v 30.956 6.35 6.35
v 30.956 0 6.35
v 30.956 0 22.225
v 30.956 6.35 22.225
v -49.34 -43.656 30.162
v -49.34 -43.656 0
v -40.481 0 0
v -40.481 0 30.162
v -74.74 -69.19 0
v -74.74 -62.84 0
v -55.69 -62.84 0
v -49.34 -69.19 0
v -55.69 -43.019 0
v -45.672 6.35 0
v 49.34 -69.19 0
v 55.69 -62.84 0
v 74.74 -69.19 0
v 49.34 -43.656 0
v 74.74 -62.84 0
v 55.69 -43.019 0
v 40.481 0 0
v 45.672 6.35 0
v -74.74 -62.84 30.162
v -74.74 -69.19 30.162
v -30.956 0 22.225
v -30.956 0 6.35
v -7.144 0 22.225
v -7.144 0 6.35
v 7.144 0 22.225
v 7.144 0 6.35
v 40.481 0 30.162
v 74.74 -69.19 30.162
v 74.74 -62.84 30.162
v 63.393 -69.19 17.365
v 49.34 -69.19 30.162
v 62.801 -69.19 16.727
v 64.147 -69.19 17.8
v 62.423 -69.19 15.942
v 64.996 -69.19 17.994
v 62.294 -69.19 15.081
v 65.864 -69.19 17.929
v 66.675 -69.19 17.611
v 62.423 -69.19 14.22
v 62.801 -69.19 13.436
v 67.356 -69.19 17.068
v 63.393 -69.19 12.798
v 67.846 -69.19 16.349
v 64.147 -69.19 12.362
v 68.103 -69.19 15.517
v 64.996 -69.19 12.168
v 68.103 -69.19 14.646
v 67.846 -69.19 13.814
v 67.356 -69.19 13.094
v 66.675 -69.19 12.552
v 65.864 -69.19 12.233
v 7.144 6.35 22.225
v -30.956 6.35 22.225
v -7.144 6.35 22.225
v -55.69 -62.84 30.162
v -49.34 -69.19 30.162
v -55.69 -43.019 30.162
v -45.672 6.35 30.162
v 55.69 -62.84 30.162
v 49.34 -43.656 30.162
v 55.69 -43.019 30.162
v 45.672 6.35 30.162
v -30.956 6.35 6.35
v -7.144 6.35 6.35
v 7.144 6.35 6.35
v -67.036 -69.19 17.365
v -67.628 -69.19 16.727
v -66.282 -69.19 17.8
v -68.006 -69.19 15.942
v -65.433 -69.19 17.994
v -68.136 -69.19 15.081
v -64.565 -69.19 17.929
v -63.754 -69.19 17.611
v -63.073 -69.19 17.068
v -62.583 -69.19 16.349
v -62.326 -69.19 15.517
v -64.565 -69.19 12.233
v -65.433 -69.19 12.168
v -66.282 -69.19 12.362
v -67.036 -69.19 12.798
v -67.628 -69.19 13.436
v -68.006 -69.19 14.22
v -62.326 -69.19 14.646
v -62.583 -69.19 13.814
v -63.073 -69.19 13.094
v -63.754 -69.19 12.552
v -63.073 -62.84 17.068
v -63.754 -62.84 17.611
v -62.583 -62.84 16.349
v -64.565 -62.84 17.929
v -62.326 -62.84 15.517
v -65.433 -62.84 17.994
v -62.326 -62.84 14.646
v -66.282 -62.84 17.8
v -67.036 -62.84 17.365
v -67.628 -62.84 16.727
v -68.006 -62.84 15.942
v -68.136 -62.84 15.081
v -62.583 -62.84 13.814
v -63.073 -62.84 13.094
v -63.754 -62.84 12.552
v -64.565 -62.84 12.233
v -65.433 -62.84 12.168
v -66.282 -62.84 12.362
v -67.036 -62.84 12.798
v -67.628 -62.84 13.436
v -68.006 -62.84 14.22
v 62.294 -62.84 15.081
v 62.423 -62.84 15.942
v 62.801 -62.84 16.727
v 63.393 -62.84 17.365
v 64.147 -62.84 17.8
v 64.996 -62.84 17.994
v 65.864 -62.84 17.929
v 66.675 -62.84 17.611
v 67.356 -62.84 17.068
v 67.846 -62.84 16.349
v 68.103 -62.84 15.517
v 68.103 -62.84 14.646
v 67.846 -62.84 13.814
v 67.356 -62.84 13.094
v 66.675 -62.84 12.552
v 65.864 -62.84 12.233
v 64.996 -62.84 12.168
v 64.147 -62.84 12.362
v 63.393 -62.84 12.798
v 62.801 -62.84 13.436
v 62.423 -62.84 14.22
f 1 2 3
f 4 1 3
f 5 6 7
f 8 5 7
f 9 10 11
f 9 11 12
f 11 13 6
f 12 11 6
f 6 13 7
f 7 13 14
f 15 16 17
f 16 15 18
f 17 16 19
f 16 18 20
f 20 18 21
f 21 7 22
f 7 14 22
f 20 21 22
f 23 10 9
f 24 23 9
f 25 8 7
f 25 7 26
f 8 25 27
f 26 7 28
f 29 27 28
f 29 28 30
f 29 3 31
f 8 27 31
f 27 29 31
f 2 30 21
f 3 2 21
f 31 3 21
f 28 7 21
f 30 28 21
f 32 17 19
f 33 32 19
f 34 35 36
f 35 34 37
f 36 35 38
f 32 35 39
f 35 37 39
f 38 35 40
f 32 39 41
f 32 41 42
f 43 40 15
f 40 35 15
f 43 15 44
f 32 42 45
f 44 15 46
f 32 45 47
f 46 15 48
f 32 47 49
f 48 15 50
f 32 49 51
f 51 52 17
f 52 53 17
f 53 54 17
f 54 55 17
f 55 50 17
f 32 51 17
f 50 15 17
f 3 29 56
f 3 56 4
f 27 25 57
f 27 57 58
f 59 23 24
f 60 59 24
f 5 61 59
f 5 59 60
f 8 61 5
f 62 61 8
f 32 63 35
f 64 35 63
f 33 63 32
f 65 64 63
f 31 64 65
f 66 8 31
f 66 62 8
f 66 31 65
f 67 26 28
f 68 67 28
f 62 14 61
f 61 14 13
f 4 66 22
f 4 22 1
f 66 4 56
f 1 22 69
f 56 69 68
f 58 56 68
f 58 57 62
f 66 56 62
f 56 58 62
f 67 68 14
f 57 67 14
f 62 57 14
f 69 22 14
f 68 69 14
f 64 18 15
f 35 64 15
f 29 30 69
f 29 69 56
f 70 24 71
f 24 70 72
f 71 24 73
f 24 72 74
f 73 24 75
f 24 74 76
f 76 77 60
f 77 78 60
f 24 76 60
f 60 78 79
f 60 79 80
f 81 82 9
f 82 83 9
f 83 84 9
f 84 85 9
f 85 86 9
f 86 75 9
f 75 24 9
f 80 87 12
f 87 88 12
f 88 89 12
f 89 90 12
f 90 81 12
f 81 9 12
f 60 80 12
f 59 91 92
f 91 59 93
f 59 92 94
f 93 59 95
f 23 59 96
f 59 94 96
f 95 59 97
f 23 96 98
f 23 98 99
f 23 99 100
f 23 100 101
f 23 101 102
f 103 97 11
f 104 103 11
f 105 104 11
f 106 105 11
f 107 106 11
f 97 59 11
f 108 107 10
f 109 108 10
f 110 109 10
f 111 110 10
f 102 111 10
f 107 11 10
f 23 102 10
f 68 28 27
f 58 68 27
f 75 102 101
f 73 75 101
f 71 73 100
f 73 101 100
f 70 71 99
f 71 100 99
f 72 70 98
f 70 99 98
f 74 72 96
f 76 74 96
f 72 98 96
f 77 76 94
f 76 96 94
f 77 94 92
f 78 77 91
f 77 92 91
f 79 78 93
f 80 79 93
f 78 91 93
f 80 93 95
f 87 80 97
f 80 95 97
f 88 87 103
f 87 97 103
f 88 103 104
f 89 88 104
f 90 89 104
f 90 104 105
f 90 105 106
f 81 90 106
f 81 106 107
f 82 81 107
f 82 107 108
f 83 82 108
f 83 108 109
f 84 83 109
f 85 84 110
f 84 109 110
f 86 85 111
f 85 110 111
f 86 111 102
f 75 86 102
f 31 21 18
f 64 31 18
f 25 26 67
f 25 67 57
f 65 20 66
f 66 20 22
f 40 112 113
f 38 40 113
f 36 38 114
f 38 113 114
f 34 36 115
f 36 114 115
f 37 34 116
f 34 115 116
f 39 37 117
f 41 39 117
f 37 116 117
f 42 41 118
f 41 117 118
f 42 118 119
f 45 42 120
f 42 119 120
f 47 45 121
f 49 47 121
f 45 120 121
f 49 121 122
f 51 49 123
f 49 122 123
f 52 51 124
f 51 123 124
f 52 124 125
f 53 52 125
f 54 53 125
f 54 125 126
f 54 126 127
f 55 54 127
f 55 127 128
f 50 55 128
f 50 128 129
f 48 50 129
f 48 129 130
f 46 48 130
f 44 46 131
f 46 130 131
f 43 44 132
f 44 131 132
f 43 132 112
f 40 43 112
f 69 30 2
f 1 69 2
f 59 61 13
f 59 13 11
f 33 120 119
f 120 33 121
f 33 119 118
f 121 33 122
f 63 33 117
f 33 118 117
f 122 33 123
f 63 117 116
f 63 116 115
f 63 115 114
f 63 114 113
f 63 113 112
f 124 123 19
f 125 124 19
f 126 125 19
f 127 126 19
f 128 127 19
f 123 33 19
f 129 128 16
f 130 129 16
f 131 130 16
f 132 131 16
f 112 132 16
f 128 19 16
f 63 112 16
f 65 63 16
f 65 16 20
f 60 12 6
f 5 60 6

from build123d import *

# Parameters (mm, degrees)
F1_DEPTH = 30.1625
F2_W     = 23.8125
F2_H     = 15.875
F3_DEPTH = 6.35
F4_R     = 2.921
F5_DEPTH = 6.35


# Not quite as in the source:
# - a feature names something its author has since deleted; it is built from what else it names


with BuildPart() as f1:
    # F0 (on Top) → F1 (new body)
    with BuildSketch(Plane.XY):
        Polygon((-40.48125, 0), (0, 0), (40.48125, 0), (49.3395, -43.65625), (49.3395, -69.1896), (55.6895, -69.1896), (74.7395, -69.1896), (74.7395, -62.8396), (55.6895, -62.8396), (55.6895, -43.0185116827), (45.6721801749, 6.35), (0, 6.35), (-45.6721801749, 6.35), (-55.6895, -43.0185116827), (-55.6895, -62.8396), (-74.7395, -62.8396), (-74.7395, -69.1896), (-55.6895, -69.1896), (-49.3395, -69.1896), (-49.3395, -43.65625), align=None)
    extrude(amount=F1_DEPTH)

    # F2 (on face) → F3 (cut, through all)
    with BuildSketch(Plane.XZ):
        with Locations((-19.05, 14.2875)):
            Rectangle(F2_W, F2_H)
        with Locations((19.05, 14.2875)):
            Rectangle(F2_W, F2_H)
    extrude(amount=-F3_DEPTH, mode=Mode.SUBTRACT)

    # F4 (on face) → F5 (cut, through all)
    with BuildSketch(Plane(origin=(0, -62.8396, 0), x_dir=(-1, 0, 0), z_dir=(0, 1, 0))):
        with Locations((65.2145, 15.08125)):
            Circle(F4_R)
        with Locations((-65.2145, 15.08125)):
            Circle(F4_R)
    extrude(amount=-F5_DEPTH, mode=Mode.SUBTRACT)


solid = f1.part
